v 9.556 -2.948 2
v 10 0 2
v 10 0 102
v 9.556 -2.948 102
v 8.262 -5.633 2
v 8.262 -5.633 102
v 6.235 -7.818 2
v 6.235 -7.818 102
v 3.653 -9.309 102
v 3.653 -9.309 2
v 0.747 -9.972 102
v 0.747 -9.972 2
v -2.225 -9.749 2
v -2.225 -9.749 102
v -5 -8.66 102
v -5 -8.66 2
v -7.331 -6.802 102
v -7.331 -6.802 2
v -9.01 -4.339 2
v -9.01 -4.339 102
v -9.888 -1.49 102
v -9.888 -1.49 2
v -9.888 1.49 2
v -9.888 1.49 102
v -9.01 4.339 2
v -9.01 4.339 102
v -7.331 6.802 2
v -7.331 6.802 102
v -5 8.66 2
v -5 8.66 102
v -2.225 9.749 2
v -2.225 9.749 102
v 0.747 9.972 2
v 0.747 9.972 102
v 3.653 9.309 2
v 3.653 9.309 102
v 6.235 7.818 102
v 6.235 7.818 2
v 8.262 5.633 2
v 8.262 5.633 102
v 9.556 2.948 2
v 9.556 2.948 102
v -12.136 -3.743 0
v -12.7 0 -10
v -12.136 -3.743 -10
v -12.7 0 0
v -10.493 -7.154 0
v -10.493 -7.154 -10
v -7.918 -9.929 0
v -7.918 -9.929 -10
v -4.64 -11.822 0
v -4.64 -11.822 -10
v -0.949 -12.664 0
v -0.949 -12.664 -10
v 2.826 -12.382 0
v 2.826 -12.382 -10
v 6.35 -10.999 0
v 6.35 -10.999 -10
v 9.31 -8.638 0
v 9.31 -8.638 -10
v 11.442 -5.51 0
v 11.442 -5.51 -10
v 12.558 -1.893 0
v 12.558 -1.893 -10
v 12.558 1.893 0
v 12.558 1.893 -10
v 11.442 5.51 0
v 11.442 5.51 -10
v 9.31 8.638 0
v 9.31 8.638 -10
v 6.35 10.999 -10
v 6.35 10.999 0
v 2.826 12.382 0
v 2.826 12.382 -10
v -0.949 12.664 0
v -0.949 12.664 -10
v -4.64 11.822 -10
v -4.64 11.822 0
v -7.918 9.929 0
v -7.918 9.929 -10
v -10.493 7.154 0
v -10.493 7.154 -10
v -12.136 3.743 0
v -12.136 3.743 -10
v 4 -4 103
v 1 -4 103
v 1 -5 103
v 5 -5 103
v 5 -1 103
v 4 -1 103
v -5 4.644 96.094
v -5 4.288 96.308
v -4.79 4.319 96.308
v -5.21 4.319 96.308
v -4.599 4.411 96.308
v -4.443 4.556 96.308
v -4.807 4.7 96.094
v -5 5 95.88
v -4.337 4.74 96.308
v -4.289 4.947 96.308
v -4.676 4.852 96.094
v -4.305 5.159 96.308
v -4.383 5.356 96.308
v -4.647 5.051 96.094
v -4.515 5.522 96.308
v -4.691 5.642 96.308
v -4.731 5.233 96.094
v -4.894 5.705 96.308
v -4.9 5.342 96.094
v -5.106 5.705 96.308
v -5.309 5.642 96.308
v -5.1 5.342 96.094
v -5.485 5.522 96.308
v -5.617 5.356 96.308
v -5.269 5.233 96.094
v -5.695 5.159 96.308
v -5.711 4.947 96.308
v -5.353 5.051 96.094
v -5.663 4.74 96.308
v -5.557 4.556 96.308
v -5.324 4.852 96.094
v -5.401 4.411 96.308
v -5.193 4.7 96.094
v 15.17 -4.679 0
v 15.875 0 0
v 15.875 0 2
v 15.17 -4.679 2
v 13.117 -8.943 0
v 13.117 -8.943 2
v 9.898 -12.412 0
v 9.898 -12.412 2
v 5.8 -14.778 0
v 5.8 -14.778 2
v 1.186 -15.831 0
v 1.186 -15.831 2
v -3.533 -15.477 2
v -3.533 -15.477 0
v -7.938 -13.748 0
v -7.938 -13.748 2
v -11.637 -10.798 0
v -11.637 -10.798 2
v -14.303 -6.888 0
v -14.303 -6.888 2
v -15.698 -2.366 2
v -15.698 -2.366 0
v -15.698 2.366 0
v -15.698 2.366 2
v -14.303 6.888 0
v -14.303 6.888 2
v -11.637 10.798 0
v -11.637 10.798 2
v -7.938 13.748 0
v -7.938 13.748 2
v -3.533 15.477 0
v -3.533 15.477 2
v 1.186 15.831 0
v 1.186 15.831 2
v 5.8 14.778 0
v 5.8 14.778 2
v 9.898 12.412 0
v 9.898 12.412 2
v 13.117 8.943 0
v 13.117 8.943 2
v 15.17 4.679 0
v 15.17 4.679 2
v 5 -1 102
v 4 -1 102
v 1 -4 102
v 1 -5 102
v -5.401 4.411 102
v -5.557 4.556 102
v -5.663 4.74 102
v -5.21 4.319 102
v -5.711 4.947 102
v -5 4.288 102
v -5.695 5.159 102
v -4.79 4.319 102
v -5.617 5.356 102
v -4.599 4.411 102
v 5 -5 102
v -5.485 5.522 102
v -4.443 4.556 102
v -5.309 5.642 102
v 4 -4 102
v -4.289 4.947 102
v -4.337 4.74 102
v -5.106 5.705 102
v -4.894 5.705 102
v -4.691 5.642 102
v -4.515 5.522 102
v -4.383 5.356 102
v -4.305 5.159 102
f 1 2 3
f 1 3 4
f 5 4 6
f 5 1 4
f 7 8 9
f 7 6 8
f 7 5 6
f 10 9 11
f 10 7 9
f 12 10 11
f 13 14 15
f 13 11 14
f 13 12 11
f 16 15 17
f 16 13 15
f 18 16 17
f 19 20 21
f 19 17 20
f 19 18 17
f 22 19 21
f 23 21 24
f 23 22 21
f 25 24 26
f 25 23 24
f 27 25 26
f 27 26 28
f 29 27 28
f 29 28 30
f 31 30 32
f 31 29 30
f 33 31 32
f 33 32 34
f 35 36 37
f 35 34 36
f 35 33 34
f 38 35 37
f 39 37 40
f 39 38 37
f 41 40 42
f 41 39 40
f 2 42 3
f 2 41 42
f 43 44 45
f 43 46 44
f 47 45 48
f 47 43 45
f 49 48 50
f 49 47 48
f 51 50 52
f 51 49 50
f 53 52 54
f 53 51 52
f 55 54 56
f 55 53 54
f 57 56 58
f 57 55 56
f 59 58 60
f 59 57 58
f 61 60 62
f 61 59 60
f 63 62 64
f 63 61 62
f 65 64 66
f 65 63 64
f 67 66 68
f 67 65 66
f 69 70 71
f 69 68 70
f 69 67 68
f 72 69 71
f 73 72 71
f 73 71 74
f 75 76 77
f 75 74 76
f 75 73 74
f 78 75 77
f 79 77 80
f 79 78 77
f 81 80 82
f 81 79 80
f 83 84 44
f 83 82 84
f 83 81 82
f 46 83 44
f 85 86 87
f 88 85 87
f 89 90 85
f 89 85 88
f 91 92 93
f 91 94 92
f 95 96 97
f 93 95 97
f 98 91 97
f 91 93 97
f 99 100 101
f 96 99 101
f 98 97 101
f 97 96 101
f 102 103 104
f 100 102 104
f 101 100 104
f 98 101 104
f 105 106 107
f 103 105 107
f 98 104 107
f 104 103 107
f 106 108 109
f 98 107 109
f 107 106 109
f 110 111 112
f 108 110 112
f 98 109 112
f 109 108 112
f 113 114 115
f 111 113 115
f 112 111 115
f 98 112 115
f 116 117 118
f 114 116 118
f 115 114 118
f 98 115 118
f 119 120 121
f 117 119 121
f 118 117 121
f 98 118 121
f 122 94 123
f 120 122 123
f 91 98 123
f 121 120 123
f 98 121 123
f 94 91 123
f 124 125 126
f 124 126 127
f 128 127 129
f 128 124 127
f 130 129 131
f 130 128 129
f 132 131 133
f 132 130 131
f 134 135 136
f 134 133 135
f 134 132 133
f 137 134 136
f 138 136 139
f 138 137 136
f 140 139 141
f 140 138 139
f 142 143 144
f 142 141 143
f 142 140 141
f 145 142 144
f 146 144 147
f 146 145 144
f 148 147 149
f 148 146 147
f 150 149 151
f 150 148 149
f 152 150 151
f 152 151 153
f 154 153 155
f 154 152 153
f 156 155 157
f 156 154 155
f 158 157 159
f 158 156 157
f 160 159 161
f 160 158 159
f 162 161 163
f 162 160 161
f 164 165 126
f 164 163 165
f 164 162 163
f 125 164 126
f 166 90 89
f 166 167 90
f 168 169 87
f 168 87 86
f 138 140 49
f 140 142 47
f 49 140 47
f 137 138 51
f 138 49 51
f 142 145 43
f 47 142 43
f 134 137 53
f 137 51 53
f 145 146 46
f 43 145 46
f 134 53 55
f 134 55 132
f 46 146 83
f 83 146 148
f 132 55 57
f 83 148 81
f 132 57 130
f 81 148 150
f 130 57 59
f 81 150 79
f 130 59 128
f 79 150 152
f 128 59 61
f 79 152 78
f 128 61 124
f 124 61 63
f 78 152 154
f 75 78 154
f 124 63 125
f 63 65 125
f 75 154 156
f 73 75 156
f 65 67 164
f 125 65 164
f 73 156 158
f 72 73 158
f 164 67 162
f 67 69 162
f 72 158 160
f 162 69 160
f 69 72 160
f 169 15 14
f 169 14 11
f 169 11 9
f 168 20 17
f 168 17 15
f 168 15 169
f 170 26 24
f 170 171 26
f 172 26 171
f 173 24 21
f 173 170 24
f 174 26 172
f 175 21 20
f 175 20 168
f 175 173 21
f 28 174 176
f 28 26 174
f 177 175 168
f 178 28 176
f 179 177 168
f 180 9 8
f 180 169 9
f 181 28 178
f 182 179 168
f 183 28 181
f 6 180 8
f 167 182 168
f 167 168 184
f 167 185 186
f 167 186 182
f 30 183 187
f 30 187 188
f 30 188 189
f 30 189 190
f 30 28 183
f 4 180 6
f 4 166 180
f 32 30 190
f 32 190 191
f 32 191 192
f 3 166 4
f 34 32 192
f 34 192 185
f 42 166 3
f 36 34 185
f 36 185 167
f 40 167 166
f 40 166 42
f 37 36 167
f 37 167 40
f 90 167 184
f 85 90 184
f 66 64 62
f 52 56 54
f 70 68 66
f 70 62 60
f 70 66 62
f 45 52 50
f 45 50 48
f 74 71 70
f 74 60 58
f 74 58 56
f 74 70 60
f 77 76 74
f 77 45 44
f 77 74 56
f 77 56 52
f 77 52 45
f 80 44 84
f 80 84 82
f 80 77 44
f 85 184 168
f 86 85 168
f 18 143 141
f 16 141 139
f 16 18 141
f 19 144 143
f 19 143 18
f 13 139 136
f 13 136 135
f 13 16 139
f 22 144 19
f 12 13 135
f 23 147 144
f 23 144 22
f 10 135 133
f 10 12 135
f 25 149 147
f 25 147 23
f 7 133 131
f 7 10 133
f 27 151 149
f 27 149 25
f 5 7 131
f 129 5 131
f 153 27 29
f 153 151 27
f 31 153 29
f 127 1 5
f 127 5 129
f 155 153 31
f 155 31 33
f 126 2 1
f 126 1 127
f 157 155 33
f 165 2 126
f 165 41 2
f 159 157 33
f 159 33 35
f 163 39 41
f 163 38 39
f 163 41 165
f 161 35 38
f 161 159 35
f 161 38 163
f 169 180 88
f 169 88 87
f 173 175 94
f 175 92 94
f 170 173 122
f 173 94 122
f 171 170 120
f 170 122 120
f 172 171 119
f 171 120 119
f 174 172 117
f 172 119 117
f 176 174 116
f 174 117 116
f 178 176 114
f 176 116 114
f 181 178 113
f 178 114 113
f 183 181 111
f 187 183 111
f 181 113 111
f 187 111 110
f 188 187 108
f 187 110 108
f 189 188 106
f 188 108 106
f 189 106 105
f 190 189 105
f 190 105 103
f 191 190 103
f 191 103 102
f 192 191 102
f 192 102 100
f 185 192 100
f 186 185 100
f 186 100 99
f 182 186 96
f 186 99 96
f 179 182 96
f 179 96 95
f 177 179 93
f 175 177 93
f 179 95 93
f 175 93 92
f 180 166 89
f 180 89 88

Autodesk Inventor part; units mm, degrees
ref_plane "YZ Plane" through (0, 0, 0) normal (1, 0, 0) x (0, 1, 0)
ref_plane "XZ Plane" through (0, 0, 0) normal (0, 1, 0) x (-1, 0, 0)
ref_plane "XY Plane" through (0, 0, 0) normal (0, 0, 1) x (1, 0, 0)
sketch "Sketch1" plane through (0, 0, 0) normal (0, 0, 1) x (1, 0, 0)
  line L0 (-20, -20) -> (20, -20)
  line L1 (20, -20) -> (20, 20)
  line L2 (20, 20) -> (-20, 20)
  line L3 (-20, 20) -> (-20, -20)
  line L4 (-20, -20) -> (20, 20) construction
  line L5 (20, -20) -> (-20, 20) construction
  circle A0 centre (0, 0) radius 15.875
  dimension "d0" = 40
  dimension "d51" = 31.75
extrude "Extrusion1" add sketch "Sketch1" along normal blind 2 contours A0
sketch "Sketch10" plane through (0, 0, 2) normal (0, 0, 1) x (1, 0, 0)
  circle A0 centre (0, 0) radius 10
  dimension "d64" = 20
extrude "Extrusion8" add sketch "Sketch10" along normal blind 100
sketch "Sketch4" plane through (0, 0, 102) normal (0, 0, 1) x (1, 0, 0)
  line L0 (-4, 4) -> (4, 4)
  line L1 (4, 4) -> (4, -4)
  line L2 (4, -4) -> (-4, -4)
  line L3 (-4, -4) -> (-4, 4)
  line L4 (-4, 4) -> (4, -4) construction
  line L5 (4, 4) -> (-4, -4) construction
  line L6 (4, -1) -> (5, -1)
  line L7 (5, -1) -> (5, -5)
  line L8 (5, -5) -> (1, -5)
  line L9 (1, -5) -> (1, -4)
  point P0 (0, 0)
  point P1 (0, 0)
  point P2 (0, 0)
  point P3 (-5, 5)
  point P4 (0, 0)
  dimension "d16" = 8
  dimension "d17" = 1
  dimension "d18" = 4
  dimension "d30" = 5
  dimension "d31" = 5
sketch "Sketch9" plane through (0, 0, 0) normal (0, 0, -1) x (-1, 0, 0)
  circle A0 centre (0, 0) radius 12.7
  dimension "d52" = 25.4
extrude "Extrusion6" add sketch "Sketch9" along normal blind 10
extrude "Extrusion7" add sketch "Sketch4" along normal blind 1 contours L6 L7 L8 L9 L2 L1
hole "Hole4" at (-5, 5, 102) direction (0, 0, -1) diameter 1.425 depth 5.692 tip angle 118 thread size "1-64 UNC" class "2B" standard "ANSI Unified Screw Threads"
equation "\"d31\" = d30"
properties part number "ChipMount"
